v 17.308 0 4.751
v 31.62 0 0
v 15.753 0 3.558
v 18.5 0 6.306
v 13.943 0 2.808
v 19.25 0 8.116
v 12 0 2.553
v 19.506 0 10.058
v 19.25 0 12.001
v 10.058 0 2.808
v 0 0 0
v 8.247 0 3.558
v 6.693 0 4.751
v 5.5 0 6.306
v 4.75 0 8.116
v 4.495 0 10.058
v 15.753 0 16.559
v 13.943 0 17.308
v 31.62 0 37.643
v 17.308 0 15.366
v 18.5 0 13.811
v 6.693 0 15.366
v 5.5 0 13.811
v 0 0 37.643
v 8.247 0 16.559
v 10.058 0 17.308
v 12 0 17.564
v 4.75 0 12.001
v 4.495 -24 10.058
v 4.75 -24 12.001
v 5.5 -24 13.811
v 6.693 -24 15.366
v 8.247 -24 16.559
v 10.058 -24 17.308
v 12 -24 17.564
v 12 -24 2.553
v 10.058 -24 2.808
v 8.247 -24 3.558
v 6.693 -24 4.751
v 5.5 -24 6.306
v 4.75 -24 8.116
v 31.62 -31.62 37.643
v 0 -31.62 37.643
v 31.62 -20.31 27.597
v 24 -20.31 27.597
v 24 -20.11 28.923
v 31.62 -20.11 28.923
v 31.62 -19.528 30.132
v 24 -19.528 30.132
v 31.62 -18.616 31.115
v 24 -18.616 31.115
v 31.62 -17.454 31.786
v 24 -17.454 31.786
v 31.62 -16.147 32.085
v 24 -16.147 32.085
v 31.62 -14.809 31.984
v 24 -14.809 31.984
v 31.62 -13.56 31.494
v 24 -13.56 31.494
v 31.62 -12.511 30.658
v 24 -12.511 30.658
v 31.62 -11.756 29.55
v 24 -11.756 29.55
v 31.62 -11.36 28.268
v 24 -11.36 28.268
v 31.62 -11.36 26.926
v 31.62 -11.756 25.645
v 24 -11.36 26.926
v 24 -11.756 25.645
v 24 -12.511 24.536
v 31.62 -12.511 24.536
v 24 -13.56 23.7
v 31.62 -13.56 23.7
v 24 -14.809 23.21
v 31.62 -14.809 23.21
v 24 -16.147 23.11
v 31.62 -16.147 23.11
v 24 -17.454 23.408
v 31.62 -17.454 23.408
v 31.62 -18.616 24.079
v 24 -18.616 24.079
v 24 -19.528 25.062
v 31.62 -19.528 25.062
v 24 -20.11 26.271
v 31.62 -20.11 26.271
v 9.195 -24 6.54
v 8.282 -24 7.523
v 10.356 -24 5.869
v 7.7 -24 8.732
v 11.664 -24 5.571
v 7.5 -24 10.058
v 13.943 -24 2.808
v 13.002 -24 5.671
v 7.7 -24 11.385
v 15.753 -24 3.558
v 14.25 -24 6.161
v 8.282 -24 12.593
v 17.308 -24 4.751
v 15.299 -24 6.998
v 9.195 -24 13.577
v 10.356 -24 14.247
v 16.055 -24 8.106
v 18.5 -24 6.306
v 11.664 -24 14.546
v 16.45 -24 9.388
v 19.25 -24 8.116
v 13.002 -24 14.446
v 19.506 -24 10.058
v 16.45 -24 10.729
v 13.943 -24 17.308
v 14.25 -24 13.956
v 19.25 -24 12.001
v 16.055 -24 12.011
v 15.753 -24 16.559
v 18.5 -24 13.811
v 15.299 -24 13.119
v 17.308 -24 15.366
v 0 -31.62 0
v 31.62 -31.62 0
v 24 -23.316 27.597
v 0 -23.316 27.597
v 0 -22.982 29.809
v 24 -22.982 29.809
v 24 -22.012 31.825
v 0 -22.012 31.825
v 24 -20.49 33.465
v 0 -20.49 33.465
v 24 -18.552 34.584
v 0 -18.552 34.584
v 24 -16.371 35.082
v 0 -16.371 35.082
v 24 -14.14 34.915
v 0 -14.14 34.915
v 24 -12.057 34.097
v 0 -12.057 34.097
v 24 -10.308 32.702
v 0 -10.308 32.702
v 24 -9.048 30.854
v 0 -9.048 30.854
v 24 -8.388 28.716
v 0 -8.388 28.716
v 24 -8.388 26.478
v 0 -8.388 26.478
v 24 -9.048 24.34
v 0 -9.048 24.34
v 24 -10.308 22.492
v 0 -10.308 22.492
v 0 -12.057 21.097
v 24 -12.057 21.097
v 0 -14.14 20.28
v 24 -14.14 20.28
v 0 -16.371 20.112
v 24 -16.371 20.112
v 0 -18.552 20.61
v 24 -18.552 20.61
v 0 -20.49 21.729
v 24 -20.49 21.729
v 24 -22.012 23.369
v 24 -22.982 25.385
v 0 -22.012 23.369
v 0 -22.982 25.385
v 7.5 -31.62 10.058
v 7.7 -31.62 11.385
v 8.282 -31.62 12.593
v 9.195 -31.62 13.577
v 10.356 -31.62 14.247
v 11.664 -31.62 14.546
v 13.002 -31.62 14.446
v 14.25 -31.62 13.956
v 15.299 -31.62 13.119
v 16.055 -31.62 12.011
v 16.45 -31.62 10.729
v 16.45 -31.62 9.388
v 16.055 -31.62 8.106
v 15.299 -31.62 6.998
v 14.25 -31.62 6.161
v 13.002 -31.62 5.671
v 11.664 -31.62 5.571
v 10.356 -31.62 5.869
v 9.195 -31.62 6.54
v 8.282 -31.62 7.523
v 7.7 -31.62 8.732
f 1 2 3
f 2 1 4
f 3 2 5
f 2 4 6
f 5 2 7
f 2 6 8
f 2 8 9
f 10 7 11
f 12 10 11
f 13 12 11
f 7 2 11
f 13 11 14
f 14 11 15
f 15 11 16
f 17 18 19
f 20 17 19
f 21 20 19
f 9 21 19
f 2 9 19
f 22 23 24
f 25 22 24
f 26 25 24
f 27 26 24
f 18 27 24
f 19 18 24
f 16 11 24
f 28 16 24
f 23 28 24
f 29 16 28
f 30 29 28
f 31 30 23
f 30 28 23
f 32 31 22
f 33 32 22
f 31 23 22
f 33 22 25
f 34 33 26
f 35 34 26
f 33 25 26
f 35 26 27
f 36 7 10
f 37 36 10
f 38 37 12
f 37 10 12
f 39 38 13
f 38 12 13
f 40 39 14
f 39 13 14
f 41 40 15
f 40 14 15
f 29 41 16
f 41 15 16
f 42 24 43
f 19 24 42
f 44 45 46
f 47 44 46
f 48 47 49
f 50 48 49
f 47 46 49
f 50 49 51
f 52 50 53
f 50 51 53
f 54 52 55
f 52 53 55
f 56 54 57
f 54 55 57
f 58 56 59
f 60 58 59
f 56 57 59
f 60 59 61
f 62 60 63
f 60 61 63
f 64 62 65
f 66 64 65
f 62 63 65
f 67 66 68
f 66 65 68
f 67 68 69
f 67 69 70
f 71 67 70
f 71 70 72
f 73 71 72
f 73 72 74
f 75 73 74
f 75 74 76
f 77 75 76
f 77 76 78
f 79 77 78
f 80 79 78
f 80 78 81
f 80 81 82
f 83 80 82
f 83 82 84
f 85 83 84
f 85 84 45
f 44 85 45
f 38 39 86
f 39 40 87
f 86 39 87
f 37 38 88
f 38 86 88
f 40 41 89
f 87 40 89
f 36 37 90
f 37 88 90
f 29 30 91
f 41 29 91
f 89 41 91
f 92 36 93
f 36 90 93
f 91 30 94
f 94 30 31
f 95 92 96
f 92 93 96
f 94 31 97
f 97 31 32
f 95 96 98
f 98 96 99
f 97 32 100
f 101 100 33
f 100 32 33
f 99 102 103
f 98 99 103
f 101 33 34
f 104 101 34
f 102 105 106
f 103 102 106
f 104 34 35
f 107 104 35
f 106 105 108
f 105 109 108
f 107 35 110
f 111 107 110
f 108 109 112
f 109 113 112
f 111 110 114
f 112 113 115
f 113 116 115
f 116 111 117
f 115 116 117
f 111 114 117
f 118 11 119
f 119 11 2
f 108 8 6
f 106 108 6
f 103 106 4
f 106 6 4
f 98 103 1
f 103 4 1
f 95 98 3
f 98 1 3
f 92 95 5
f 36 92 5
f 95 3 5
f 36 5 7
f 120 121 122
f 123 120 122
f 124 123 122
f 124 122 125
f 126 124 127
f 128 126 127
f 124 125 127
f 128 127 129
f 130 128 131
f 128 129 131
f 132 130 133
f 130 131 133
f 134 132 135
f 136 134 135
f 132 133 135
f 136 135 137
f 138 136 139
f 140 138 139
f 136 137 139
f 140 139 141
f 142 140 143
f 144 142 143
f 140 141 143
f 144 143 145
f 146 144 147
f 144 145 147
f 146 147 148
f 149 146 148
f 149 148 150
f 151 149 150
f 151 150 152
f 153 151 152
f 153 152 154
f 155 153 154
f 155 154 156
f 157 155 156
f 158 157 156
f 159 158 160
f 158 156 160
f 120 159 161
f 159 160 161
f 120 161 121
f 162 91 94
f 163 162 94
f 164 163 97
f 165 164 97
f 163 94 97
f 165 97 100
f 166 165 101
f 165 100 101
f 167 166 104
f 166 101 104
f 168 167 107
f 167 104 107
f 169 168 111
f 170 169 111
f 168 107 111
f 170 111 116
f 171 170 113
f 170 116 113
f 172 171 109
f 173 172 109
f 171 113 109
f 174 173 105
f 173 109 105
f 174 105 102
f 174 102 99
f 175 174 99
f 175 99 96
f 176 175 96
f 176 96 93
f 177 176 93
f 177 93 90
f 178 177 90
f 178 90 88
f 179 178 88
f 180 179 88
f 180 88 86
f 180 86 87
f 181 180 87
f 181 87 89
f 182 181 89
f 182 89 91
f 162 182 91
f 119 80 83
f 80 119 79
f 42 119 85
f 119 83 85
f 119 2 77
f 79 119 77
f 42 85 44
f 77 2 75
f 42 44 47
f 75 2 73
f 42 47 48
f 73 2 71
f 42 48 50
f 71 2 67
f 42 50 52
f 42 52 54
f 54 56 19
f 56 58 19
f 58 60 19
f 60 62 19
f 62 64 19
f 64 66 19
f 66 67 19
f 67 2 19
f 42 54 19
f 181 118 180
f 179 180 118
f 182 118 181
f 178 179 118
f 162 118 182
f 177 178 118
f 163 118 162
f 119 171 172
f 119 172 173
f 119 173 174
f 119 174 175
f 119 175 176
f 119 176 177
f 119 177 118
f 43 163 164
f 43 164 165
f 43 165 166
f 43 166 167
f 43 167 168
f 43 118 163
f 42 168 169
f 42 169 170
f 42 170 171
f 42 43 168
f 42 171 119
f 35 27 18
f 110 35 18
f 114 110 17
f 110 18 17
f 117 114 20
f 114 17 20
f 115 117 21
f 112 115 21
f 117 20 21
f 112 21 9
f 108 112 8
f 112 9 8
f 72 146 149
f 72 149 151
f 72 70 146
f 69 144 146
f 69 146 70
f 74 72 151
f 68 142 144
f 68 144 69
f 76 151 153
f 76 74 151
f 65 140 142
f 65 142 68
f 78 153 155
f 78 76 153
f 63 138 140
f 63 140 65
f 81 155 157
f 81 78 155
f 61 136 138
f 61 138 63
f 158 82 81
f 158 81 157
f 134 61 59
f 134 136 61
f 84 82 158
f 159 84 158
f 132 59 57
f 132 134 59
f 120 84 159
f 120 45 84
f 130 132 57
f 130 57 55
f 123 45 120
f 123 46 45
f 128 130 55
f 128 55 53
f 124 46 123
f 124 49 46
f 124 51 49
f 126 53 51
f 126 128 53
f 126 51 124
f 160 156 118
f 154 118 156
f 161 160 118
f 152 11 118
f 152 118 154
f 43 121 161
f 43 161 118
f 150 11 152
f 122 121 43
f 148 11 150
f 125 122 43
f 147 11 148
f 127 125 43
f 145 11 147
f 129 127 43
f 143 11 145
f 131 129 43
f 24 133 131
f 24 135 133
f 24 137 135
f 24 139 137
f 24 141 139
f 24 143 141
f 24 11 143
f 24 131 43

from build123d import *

# Parameters (mm, degrees)
F0_W      = 12.00023
F0_H      = 10.0584
F1_DEPTH  = 24.00046
F2_W      = 24.00046
F2_H      = 37.6428
F3_DEPTH  = 7.62
F4_W      = 31.62046
F4_H      = 37.6428
F4_R      = 7.5057
F5_DEPTH  = 7.62
F6_R      = 4.5
F7_DEPTH  = 25.4
F9_DEPTH  = 24.00046
F10_R     = 4.5
F11_DEPTH = 25.4


with BuildPart() as f1:
    # F0 (on Front) → F1 (new body)
    with BuildSketch(Plane.XZ):
        with BuildLine():
            Line((0, 10.0584), (0, 0))
            Line((0, 0), (12.00023, 0))
            Line((12.00023, 0), (12.00023, 2.5527))
            ThreePointArc((12.00023, 2.5527), (6.6928986324, 4.7510686324), (4.49453, 10.0584))
            Line((4.49453, 10.0584), (0, 10.0584))
        make_face()
        with BuildLine():
            Line((0, 27.5844), (0, 10.0584))
            Line((0, 10.0584), (4.49453, 10.0584))
            ThreePointArc((4.49453, 10.0584), (6.6928986324, 15.3657313676), (12.00023, 17.5641))
            Line((12.00023, 17.5641), (12.00023, 27.5844))
            Line((12.00023, 27.5844), (0, 27.5844))
        make_face()
        with Locations((6.000115, 32.6136)):
            Rectangle(F0_W, F0_H)
        with Locations((18.000345, 32.6136)):
            Rectangle(F0_W, F0_H)
        with BuildLine():
            Line((19.50593, 10.0584), (24.00046, 10.0584))
            Line((24.00046, 10.0584), (24.00046, 27.5844))
            Line((24.00046, 27.5844), (12.00023, 27.5844))
            Line((12.00023, 27.5844), (12.00023, 17.5641))
            ThreePointArc((12.00023, 17.5641), (17.3075613676, 15.3657313676), (19.50593, 10.0584))
        make_face()
        with BuildLine():
            Line((12.00023, 2.5527), (12.00023, 0))
            Line((12.00023, 0), (24.00046, 0))
            Line((24.00046, 0), (24.00046, 10.0584))
            Line((24.00046, 10.0584), (19.50593, 10.0584))
            ThreePointArc((19.50593, 10.0584), (17.3075613676, 4.7510686324), (12.00023, 2.5527))
        make_face()
    extrude(amount=F1_DEPTH)

    # F2 (on face) → F3 (join)
    with BuildSketch(Plane.YZ.offset(24.00046)):
        with Locations((-12.00023, 18.8214)):
            Rectangle(F2_W, F2_H)
    extrude(amount=F3_DEPTH)

    # F4 (on face) → F5 (join)
    with BuildSketch(Plane.XZ.offset(24.00046)):
        with Locations((15.81023, 18.8214)):
            Rectangle(F4_W, F4_H)
        with Locations((12.00023, 10.0584)):
            Circle(F4_R, mode=Mode.SUBTRACT)
        with Locations((12.00023, 10.0584)):
            Circle(F4_R)
    extrude(amount=F5_DEPTH)

    # F6 (on face) → F7 (cut)
    with BuildSketch(Plane(origin=(0, -24.00046, 0), x_dir=(-1, 0, 0), z_dir=(0, 1, 0))):
        with Locations((-12.00023, 10.0584)):
            Circle(F6_R)
    extrude(amount=-F7_DEPTH, mode=Mode.SUBTRACT)

    # F8 (on face) → F9 (cut)
    with BuildSketch(Plane(origin=(0, 0, 0), x_dir=(0, -1, 0), z_dir=(-1, 0, 0))):
        with BuildLine():
            ThreePointArc((8.30453, 27.5971), (15.81023, 20.0914), (23.31593, 27.5971))
            Line((23.31593, 27.5971), (15.81023, 27.5971))
            Line((15.81023, 27.5971), (8.30453, 27.5971))
        make_face()
        with BuildLine():
            Line((15.81023, 27.5971), (23.31593, 27.5971))
            ThreePointArc((23.31593, 27.5971), (15.81023, 35.1028), (8.30453, 27.5971))
            Line((8.30453, 27.5971), (15.81023, 27.5971))
        make_face()
    extrude(amount=-F9_DEPTH, mode=Mode.SUBTRACT)

    # F10 (on face) → F11 (cut)
    with BuildSketch(Plane(origin=(24.00046, 0, 0), x_dir=(0, -1, 0), z_dir=(-1, 0, 0))):
        with Locations((15.81023, 27.5971)):
            Circle(F10_R)
    extrude(amount=-F11_DEPTH, mode=Mode.SUBTRACT)


solid = f1.part
